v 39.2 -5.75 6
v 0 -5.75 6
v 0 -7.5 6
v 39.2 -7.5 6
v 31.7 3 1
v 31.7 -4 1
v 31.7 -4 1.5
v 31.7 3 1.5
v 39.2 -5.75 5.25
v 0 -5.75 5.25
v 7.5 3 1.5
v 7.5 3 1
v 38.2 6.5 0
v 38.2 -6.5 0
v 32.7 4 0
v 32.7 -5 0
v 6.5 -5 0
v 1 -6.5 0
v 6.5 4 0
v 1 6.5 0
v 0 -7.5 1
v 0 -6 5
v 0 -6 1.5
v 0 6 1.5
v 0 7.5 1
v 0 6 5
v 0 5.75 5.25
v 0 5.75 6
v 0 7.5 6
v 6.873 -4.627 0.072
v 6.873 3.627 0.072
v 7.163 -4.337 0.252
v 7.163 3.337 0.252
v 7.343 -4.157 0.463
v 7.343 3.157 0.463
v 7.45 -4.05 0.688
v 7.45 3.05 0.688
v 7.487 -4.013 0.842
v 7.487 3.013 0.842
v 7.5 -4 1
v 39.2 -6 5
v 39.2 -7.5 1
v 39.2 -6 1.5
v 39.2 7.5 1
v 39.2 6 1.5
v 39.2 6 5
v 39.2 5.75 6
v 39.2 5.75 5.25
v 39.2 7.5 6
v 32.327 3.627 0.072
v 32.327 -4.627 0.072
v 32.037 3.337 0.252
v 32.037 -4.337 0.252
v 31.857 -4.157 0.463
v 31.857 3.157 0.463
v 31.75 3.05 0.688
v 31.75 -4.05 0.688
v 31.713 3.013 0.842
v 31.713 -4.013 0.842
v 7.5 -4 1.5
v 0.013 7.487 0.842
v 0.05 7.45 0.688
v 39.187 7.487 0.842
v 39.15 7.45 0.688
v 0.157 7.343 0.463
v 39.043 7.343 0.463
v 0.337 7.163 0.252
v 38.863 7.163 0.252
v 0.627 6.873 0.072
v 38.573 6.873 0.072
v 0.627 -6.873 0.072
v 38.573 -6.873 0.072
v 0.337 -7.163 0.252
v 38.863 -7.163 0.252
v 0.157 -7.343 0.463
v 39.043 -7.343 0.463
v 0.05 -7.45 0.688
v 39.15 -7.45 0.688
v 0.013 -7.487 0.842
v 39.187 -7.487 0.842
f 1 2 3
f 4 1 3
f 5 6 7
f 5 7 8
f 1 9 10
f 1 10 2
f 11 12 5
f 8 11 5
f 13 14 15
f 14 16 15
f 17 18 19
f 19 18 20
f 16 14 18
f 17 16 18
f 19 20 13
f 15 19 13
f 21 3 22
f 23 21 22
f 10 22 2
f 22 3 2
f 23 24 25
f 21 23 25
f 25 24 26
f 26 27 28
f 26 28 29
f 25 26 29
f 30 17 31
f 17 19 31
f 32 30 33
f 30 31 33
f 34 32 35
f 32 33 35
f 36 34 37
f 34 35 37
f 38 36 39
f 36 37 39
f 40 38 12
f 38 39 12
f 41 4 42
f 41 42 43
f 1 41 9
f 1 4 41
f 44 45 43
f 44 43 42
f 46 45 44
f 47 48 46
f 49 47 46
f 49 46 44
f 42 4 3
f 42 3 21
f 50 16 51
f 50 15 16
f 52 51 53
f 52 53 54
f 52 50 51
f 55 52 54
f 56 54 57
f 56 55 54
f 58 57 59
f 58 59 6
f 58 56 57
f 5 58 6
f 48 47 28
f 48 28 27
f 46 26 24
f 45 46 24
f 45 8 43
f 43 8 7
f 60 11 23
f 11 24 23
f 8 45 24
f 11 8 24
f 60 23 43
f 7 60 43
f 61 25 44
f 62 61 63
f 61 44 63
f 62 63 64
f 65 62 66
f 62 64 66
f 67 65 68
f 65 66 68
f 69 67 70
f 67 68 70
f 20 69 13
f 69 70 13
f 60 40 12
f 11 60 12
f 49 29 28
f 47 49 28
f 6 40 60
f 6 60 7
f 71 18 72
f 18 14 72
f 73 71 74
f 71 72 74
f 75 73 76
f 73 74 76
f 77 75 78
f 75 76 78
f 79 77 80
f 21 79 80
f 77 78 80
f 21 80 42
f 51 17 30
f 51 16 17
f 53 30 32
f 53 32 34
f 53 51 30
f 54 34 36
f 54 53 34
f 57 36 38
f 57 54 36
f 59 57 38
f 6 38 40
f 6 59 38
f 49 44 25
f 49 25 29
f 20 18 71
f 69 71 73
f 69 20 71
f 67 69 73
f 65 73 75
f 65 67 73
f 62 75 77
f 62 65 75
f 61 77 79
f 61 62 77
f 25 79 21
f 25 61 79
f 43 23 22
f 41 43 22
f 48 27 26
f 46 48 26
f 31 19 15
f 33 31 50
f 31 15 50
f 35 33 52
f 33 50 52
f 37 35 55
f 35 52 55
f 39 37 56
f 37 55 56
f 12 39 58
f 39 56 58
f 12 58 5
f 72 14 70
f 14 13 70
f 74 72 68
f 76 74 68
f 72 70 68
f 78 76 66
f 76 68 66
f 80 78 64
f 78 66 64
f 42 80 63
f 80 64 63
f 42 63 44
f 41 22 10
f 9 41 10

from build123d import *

# Parameters (mm, degrees)
PAD_DEPTH    = 39.2
SKETCH001_W  = 7
SKETCH001_H  = 24.2
POCKET_DEPTH = 6.001
FILLET_R     = 1


with BuildPart() as part:
    # Sketch → Pad (new body)
    with BuildSketch(Plane.YZ):
        Polygon((7.5, 0), (7.5, 6), (5.75, 6), (5.75, 5.25), (6, 5), (6, 1.5), (-6, 1.5), (-6, 5), (-5.75, 5.25), (-5.75, 6), (-7.5, 6), (-7.5, 0), align=None)
    extrude(amount=PAD_DEPTH)

    # Sketch001 (on Face12 of Pad) → Pocket (cut, through all)
    with BuildSketch(Plane.YX):
        with Locations((-0.5, 19.6)):
            Rectangle(SKETCH001_W, SKETCH001_H)
    extrude(amount=-POCKET_DEPTH, mode=Mode.SUBTRACT)

    # Fillet
    fillet_edges = [part.edges().sort_by_distance(p)[0] for p in [
        (19.6, -7.5, 0),
        (0, 0, 0),
        (39.2, 0, 0),
        (19.6, 7.5, 0),
        (19.6, -4, 0),
        (31.7, -0.5, 0),
        (19.6, 3, 0),
        (7.5, -0.5, 0),
    ]]
    fillet(fillet_edges, radius=FILLET_R)


solid = part.part
